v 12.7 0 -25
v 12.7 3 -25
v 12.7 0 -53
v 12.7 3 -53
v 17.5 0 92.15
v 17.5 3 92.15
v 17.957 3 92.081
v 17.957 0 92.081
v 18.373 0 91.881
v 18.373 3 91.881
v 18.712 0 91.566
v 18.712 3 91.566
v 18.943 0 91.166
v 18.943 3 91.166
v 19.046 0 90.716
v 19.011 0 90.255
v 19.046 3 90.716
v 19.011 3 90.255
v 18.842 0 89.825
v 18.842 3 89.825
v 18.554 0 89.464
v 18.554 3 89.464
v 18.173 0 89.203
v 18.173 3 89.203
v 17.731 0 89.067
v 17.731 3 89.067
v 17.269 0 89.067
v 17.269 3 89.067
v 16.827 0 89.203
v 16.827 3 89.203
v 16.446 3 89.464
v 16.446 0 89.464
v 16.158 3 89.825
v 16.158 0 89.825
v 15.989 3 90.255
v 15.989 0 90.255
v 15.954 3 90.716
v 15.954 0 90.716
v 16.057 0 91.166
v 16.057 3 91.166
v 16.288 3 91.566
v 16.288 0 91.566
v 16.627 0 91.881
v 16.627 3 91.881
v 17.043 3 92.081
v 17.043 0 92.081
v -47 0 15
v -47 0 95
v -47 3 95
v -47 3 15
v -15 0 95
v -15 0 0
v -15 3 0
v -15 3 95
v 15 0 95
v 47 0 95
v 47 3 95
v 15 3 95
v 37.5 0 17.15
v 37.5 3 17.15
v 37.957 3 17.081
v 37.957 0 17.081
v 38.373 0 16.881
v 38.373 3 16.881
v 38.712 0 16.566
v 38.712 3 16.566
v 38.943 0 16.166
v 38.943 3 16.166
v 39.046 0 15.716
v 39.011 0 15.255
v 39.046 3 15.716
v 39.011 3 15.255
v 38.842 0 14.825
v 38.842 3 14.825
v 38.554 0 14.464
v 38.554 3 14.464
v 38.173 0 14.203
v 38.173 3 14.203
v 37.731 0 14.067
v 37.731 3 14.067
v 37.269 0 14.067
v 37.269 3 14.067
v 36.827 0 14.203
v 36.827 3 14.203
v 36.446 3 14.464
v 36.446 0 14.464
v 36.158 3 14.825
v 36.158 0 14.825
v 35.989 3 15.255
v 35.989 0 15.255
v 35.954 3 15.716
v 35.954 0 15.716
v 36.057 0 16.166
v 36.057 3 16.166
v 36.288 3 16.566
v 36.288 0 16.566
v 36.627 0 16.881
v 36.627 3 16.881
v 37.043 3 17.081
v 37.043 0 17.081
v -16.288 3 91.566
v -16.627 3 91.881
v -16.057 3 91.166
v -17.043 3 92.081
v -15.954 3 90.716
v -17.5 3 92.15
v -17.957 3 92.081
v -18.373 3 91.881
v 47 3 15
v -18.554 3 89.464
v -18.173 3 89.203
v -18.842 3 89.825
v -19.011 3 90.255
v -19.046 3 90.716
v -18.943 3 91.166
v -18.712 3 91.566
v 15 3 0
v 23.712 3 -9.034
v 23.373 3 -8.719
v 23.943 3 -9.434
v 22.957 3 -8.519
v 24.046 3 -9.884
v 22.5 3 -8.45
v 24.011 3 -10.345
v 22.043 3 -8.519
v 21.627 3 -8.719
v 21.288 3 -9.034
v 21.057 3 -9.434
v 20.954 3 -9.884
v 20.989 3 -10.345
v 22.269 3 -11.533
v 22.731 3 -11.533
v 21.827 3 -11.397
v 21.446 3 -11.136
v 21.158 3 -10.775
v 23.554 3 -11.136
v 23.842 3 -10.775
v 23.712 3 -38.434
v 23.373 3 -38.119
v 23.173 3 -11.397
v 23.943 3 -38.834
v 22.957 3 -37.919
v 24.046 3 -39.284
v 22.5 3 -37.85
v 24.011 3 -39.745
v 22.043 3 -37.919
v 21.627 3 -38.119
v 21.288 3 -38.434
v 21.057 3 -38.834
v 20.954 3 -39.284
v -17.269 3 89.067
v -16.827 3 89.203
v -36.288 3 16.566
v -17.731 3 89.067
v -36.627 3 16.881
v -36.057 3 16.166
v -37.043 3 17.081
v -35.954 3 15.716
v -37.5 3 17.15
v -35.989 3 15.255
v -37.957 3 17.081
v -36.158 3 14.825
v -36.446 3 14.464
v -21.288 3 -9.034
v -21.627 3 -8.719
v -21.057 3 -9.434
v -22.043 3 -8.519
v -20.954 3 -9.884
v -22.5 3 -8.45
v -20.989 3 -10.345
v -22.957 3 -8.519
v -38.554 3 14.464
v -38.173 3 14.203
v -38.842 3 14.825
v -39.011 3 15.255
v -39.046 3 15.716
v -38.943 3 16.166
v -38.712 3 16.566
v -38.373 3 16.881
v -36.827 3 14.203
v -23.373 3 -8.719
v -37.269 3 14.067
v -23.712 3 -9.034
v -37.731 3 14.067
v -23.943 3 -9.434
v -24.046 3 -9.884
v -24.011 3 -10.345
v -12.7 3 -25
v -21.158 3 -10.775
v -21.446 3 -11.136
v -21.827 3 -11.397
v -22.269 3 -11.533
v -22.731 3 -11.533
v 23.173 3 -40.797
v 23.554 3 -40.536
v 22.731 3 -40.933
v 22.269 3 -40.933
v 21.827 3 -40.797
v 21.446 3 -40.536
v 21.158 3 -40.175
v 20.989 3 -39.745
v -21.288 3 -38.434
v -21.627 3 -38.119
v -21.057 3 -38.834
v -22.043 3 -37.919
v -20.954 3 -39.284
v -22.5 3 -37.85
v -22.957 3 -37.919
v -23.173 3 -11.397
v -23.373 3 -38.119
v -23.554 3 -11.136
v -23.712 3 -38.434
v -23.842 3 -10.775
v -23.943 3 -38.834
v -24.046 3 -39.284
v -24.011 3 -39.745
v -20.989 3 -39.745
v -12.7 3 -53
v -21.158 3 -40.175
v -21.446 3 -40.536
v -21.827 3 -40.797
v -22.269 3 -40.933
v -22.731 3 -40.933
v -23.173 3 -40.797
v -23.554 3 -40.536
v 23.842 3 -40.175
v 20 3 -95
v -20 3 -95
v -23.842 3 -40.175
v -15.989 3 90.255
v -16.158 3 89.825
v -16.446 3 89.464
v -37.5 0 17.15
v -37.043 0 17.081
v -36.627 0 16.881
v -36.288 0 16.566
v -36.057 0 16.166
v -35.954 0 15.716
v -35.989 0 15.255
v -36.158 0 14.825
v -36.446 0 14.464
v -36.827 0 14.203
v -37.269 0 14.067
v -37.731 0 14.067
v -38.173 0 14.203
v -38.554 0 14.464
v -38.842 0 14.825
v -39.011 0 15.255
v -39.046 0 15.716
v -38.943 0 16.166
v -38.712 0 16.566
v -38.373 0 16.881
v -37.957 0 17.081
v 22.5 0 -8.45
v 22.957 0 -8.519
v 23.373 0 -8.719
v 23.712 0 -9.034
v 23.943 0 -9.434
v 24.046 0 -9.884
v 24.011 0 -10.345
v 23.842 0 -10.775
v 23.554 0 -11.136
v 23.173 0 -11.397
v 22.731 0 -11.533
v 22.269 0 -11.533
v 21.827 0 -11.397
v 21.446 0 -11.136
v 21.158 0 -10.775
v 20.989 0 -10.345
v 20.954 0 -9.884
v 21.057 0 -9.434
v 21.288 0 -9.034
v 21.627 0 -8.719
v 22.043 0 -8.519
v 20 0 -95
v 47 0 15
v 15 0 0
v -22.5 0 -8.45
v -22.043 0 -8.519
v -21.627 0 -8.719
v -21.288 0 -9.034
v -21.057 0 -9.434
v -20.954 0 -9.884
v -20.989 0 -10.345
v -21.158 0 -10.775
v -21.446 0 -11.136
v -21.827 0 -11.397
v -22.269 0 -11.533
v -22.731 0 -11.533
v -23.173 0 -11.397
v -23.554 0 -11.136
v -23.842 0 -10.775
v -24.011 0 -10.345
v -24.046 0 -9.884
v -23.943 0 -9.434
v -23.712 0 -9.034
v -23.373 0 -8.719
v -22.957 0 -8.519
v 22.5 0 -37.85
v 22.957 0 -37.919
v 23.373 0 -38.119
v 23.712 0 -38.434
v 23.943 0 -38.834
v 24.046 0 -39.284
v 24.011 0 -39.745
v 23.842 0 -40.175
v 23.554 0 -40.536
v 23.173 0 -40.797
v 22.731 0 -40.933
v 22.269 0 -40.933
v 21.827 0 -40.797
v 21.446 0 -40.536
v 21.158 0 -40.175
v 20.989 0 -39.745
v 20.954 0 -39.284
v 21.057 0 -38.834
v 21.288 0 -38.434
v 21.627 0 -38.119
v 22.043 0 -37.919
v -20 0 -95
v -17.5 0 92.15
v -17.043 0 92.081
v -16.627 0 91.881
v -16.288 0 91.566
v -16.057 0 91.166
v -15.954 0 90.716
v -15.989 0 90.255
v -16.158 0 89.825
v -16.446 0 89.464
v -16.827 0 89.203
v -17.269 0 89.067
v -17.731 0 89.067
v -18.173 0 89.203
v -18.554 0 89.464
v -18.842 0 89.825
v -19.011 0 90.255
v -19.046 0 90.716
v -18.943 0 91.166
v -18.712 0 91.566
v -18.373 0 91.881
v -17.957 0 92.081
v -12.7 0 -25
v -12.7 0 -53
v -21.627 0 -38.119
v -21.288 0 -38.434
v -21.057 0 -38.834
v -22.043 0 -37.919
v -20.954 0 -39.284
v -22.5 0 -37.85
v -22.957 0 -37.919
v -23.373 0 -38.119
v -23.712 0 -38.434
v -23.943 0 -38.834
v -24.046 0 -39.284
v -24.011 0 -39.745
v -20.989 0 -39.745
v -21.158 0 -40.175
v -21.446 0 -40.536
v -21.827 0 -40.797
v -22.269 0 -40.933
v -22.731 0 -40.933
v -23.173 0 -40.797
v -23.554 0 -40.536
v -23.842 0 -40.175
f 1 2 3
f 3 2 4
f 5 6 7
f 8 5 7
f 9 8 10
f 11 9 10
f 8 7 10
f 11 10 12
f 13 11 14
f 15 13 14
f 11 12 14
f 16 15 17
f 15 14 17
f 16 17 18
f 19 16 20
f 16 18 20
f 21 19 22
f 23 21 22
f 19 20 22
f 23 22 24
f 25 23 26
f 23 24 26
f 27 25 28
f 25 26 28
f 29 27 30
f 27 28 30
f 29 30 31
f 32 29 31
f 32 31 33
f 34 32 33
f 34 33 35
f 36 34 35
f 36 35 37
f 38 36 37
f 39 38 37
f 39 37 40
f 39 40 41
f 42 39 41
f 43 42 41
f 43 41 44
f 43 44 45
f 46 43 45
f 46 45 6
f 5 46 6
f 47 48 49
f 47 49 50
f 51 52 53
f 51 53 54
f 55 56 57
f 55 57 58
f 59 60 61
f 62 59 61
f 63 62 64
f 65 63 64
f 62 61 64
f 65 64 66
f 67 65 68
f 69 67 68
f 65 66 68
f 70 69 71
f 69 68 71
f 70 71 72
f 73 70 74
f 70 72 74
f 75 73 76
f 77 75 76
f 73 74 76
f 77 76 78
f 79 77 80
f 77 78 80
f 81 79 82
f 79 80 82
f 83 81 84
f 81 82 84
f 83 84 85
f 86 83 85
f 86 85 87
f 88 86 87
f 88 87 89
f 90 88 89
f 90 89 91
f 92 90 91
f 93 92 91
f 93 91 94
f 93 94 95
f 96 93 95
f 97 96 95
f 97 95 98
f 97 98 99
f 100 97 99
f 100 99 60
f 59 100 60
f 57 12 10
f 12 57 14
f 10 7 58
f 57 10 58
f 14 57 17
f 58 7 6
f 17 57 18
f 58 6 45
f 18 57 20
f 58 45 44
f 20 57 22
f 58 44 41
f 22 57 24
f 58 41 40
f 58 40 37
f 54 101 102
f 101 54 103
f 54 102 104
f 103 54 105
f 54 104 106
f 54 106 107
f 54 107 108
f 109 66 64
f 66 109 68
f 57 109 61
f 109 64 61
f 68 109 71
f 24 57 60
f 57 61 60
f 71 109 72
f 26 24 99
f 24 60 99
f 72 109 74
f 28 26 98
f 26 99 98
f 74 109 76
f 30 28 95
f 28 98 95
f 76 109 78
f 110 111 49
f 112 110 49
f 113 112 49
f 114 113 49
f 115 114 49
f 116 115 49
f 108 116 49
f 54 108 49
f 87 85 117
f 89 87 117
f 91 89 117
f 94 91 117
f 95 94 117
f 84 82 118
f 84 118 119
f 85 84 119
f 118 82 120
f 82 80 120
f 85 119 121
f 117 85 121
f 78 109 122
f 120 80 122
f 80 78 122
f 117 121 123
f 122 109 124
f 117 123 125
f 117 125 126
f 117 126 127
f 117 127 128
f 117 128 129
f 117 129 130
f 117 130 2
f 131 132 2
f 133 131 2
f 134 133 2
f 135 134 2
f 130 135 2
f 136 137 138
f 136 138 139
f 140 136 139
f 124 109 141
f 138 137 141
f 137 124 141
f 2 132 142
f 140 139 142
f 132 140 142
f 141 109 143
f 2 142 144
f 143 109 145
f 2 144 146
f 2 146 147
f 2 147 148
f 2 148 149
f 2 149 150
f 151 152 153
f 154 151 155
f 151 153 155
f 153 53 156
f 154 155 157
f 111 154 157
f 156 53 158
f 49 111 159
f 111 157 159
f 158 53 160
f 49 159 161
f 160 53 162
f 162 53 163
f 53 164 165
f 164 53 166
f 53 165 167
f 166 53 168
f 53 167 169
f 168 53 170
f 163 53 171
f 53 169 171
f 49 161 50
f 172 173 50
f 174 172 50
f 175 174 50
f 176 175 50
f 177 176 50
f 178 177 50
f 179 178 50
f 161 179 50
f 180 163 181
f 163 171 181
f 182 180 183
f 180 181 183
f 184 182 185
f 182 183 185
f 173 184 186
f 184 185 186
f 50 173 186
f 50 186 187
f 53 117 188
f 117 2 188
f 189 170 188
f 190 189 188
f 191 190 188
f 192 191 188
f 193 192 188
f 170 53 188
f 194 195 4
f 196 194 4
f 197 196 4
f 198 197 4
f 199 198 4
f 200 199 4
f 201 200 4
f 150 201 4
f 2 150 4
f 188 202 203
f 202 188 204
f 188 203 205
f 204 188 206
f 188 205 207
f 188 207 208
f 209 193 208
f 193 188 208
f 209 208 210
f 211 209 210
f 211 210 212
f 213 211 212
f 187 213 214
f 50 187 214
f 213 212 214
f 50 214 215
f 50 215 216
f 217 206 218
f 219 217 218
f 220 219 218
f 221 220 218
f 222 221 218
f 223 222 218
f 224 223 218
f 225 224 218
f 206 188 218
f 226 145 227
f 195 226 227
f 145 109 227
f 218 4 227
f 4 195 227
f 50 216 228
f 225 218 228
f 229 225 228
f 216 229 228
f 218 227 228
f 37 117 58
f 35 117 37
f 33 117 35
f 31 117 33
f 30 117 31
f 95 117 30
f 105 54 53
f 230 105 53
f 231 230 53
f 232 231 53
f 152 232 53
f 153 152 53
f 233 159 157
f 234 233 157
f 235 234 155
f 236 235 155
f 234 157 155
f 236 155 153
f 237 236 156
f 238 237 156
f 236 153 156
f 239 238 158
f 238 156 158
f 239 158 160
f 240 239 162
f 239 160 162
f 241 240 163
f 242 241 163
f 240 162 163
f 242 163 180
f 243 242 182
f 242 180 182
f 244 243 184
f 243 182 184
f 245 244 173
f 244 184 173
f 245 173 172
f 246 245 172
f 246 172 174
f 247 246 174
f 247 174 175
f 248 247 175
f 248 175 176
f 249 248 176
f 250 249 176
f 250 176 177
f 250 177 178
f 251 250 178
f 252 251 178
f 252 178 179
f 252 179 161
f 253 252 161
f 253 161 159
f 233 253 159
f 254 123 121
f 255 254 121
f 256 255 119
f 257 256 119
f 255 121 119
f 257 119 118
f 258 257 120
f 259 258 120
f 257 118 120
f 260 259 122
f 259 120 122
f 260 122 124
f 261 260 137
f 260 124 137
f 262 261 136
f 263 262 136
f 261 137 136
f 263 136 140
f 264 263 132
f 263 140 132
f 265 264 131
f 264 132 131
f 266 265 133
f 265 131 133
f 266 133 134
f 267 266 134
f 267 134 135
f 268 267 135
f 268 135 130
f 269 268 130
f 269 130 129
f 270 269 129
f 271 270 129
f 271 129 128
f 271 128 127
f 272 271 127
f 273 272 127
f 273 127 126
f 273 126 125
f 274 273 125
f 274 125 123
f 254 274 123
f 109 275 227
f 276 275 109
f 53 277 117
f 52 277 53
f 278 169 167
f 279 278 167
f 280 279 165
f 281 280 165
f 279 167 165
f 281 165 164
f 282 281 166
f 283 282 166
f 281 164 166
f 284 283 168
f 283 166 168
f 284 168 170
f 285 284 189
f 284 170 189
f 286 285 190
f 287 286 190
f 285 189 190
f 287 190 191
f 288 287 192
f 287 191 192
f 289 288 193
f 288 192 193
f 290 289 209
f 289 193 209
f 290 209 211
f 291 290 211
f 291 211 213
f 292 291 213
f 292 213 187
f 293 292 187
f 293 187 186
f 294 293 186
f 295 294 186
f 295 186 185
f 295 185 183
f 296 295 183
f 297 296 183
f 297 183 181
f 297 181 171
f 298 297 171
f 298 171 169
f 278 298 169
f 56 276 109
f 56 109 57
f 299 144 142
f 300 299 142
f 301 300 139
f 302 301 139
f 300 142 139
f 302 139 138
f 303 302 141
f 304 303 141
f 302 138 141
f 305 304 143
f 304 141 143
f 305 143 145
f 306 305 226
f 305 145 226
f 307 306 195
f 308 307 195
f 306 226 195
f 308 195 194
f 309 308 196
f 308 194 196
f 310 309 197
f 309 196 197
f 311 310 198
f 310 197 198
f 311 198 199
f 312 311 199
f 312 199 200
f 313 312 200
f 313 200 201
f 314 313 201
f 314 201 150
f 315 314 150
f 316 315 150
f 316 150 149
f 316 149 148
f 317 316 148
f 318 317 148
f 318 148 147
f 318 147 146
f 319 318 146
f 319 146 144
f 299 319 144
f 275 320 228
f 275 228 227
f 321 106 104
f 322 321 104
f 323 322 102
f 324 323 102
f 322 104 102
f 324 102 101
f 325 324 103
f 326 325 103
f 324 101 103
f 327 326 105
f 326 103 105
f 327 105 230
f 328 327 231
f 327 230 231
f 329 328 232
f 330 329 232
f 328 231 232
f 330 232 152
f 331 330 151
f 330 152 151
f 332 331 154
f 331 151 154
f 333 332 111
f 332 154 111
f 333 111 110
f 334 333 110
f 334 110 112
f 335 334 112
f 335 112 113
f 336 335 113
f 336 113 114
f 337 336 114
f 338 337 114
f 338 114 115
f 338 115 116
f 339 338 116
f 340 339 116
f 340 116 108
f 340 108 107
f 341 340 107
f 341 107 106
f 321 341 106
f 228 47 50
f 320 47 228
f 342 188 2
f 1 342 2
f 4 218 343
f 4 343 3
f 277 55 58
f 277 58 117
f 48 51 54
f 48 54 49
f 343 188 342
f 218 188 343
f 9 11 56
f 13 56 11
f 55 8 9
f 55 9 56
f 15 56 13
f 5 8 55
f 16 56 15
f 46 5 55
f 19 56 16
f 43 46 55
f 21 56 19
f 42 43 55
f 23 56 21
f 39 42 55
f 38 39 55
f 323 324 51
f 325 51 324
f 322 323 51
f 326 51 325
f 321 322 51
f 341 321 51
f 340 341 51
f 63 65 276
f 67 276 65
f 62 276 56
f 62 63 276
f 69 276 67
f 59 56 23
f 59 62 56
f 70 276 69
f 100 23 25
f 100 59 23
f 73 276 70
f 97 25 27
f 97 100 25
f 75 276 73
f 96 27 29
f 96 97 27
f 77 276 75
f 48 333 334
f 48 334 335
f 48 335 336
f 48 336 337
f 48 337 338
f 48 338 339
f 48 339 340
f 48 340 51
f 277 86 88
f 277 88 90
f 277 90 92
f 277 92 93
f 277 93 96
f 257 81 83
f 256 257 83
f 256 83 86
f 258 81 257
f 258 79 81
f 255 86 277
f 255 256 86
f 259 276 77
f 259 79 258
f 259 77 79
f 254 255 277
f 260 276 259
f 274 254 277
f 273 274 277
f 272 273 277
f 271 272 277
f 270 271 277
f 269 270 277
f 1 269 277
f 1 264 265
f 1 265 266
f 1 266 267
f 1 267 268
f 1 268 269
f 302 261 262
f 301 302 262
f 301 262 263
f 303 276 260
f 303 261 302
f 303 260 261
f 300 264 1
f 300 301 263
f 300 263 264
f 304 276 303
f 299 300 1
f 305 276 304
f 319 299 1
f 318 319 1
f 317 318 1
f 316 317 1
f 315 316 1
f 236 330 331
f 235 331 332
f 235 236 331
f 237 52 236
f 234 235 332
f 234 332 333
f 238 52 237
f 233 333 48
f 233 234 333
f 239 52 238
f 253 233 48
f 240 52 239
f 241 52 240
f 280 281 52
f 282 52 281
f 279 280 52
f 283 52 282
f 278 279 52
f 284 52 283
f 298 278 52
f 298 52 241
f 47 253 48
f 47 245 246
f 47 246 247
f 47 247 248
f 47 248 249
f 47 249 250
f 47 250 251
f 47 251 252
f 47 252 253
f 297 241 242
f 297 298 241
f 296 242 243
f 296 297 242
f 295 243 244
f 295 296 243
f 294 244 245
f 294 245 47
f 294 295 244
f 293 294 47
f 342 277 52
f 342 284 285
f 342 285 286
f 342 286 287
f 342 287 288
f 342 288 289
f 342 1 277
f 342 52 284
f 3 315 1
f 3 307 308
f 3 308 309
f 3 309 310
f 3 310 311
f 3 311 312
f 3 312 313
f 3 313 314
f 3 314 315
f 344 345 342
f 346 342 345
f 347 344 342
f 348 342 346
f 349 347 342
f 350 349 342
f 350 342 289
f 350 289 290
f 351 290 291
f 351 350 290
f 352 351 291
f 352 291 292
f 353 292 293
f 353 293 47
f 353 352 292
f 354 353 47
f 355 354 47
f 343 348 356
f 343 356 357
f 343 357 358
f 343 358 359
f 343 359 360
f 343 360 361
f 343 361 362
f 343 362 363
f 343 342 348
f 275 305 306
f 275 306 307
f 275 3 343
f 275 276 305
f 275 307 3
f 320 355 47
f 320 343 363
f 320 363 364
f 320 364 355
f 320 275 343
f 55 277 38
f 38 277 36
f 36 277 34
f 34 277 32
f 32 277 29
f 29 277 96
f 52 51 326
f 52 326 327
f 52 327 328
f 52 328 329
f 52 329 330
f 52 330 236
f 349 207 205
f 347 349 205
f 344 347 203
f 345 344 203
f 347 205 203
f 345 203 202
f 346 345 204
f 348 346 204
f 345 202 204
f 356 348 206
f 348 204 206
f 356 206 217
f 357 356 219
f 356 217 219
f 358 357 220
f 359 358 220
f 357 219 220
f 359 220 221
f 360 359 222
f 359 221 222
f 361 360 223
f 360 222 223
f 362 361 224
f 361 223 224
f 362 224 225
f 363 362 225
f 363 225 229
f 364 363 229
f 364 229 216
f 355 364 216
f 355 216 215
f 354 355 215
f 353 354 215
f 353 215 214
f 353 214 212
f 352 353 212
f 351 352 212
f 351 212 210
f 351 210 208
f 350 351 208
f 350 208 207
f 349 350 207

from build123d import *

# Parameters (mm, degrees)
BODY_DEPTH             = 3
SKETCH5_W              = 25.4
SKETCH5_H              = 28
PROTOBOARD_MOUNT_DEPTH = 10
SKETCH8_R              = 1.55
STAND_OFF_MOUNT_DEPTH  = 10
SKETCH9_R              = 1.55
PHONE_MOUNT_DEPTH      = 10


with BuildPart() as part:
    # Sketch3 → Body (new body)
    with BuildSketch(Plane(origin=(0, 0, 0), x_dir=(1, 0, 0), z_dir=(0, 1, 0))):
        Polygon((-15, -95), (-47, -95), (-47, -15), (-20, 95), (20, 95), (47, -15), (47, -95), (15, -95), (15, 0), (-15, 0), align=None)
    extrude(amount=BODY_DEPTH)

    # Sketch5 → Protoboard Mount (cut)
    with BuildSketch(Plane(origin=(0, 3, 0), x_dir=(1, 0, 0), z_dir=(0, 1, 0))):
        with Locations((0, 39)):
            Rectangle(SKETCH5_W, SKETCH5_H)
    extrude(amount=-PROTOBOARD_MOUNT_DEPTH, mode=Mode.SUBTRACT)

    # Sketch8 → Stand Off Mount (cut)
    with BuildSketch(Plane(origin=(0, 3, 0), x_dir=(1, 0, 0), z_dir=(0, 1, 0))):
        with Locations(Location((-22.5, 39.4, 0), (0, 0, 270))):
            Circle(SKETCH8_R)
        with Locations(Location((22.5, 39.4, 0), (0, 0, 270))):
            Circle(SKETCH8_R)
        with Locations(Location((37.5, -15.6, 0), (0, 0, 270))):
            Circle(SKETCH8_R)
        with Locations(Location((-37.5, -15.6, 0), (0, 0, 270))):
            Circle(SKETCH8_R)
        with Locations(Location((-17.5, -90.6, 0), (0, 0, 270))):
            Circle(SKETCH8_R)
        with Locations(Location((17.5, -90.6, 0), (0, 0, 270))):
            Circle(SKETCH8_R)
    extrude(amount=-STAND_OFF_MOUNT_DEPTH, mode=Mode.SUBTRACT)

    # Sketch9 → Phone Mount (cut)
    with BuildSketch(Plane(origin=(0, 3, 0), x_dir=(1, 0, 0), z_dir=(0, 1, 0))):
        with Locations(Location((-22.5, 10, 0), (0, 0, 270))):
            Circle(SKETCH9_R)
        with Locations(Location((22.5, 10, 0), (0, 0, 270))):
            Circle(SKETCH9_R)
    extrude(amount=-PHONE_MOUNT_DEPTH, mode=Mode.SUBTRACT)


solid = part.part
